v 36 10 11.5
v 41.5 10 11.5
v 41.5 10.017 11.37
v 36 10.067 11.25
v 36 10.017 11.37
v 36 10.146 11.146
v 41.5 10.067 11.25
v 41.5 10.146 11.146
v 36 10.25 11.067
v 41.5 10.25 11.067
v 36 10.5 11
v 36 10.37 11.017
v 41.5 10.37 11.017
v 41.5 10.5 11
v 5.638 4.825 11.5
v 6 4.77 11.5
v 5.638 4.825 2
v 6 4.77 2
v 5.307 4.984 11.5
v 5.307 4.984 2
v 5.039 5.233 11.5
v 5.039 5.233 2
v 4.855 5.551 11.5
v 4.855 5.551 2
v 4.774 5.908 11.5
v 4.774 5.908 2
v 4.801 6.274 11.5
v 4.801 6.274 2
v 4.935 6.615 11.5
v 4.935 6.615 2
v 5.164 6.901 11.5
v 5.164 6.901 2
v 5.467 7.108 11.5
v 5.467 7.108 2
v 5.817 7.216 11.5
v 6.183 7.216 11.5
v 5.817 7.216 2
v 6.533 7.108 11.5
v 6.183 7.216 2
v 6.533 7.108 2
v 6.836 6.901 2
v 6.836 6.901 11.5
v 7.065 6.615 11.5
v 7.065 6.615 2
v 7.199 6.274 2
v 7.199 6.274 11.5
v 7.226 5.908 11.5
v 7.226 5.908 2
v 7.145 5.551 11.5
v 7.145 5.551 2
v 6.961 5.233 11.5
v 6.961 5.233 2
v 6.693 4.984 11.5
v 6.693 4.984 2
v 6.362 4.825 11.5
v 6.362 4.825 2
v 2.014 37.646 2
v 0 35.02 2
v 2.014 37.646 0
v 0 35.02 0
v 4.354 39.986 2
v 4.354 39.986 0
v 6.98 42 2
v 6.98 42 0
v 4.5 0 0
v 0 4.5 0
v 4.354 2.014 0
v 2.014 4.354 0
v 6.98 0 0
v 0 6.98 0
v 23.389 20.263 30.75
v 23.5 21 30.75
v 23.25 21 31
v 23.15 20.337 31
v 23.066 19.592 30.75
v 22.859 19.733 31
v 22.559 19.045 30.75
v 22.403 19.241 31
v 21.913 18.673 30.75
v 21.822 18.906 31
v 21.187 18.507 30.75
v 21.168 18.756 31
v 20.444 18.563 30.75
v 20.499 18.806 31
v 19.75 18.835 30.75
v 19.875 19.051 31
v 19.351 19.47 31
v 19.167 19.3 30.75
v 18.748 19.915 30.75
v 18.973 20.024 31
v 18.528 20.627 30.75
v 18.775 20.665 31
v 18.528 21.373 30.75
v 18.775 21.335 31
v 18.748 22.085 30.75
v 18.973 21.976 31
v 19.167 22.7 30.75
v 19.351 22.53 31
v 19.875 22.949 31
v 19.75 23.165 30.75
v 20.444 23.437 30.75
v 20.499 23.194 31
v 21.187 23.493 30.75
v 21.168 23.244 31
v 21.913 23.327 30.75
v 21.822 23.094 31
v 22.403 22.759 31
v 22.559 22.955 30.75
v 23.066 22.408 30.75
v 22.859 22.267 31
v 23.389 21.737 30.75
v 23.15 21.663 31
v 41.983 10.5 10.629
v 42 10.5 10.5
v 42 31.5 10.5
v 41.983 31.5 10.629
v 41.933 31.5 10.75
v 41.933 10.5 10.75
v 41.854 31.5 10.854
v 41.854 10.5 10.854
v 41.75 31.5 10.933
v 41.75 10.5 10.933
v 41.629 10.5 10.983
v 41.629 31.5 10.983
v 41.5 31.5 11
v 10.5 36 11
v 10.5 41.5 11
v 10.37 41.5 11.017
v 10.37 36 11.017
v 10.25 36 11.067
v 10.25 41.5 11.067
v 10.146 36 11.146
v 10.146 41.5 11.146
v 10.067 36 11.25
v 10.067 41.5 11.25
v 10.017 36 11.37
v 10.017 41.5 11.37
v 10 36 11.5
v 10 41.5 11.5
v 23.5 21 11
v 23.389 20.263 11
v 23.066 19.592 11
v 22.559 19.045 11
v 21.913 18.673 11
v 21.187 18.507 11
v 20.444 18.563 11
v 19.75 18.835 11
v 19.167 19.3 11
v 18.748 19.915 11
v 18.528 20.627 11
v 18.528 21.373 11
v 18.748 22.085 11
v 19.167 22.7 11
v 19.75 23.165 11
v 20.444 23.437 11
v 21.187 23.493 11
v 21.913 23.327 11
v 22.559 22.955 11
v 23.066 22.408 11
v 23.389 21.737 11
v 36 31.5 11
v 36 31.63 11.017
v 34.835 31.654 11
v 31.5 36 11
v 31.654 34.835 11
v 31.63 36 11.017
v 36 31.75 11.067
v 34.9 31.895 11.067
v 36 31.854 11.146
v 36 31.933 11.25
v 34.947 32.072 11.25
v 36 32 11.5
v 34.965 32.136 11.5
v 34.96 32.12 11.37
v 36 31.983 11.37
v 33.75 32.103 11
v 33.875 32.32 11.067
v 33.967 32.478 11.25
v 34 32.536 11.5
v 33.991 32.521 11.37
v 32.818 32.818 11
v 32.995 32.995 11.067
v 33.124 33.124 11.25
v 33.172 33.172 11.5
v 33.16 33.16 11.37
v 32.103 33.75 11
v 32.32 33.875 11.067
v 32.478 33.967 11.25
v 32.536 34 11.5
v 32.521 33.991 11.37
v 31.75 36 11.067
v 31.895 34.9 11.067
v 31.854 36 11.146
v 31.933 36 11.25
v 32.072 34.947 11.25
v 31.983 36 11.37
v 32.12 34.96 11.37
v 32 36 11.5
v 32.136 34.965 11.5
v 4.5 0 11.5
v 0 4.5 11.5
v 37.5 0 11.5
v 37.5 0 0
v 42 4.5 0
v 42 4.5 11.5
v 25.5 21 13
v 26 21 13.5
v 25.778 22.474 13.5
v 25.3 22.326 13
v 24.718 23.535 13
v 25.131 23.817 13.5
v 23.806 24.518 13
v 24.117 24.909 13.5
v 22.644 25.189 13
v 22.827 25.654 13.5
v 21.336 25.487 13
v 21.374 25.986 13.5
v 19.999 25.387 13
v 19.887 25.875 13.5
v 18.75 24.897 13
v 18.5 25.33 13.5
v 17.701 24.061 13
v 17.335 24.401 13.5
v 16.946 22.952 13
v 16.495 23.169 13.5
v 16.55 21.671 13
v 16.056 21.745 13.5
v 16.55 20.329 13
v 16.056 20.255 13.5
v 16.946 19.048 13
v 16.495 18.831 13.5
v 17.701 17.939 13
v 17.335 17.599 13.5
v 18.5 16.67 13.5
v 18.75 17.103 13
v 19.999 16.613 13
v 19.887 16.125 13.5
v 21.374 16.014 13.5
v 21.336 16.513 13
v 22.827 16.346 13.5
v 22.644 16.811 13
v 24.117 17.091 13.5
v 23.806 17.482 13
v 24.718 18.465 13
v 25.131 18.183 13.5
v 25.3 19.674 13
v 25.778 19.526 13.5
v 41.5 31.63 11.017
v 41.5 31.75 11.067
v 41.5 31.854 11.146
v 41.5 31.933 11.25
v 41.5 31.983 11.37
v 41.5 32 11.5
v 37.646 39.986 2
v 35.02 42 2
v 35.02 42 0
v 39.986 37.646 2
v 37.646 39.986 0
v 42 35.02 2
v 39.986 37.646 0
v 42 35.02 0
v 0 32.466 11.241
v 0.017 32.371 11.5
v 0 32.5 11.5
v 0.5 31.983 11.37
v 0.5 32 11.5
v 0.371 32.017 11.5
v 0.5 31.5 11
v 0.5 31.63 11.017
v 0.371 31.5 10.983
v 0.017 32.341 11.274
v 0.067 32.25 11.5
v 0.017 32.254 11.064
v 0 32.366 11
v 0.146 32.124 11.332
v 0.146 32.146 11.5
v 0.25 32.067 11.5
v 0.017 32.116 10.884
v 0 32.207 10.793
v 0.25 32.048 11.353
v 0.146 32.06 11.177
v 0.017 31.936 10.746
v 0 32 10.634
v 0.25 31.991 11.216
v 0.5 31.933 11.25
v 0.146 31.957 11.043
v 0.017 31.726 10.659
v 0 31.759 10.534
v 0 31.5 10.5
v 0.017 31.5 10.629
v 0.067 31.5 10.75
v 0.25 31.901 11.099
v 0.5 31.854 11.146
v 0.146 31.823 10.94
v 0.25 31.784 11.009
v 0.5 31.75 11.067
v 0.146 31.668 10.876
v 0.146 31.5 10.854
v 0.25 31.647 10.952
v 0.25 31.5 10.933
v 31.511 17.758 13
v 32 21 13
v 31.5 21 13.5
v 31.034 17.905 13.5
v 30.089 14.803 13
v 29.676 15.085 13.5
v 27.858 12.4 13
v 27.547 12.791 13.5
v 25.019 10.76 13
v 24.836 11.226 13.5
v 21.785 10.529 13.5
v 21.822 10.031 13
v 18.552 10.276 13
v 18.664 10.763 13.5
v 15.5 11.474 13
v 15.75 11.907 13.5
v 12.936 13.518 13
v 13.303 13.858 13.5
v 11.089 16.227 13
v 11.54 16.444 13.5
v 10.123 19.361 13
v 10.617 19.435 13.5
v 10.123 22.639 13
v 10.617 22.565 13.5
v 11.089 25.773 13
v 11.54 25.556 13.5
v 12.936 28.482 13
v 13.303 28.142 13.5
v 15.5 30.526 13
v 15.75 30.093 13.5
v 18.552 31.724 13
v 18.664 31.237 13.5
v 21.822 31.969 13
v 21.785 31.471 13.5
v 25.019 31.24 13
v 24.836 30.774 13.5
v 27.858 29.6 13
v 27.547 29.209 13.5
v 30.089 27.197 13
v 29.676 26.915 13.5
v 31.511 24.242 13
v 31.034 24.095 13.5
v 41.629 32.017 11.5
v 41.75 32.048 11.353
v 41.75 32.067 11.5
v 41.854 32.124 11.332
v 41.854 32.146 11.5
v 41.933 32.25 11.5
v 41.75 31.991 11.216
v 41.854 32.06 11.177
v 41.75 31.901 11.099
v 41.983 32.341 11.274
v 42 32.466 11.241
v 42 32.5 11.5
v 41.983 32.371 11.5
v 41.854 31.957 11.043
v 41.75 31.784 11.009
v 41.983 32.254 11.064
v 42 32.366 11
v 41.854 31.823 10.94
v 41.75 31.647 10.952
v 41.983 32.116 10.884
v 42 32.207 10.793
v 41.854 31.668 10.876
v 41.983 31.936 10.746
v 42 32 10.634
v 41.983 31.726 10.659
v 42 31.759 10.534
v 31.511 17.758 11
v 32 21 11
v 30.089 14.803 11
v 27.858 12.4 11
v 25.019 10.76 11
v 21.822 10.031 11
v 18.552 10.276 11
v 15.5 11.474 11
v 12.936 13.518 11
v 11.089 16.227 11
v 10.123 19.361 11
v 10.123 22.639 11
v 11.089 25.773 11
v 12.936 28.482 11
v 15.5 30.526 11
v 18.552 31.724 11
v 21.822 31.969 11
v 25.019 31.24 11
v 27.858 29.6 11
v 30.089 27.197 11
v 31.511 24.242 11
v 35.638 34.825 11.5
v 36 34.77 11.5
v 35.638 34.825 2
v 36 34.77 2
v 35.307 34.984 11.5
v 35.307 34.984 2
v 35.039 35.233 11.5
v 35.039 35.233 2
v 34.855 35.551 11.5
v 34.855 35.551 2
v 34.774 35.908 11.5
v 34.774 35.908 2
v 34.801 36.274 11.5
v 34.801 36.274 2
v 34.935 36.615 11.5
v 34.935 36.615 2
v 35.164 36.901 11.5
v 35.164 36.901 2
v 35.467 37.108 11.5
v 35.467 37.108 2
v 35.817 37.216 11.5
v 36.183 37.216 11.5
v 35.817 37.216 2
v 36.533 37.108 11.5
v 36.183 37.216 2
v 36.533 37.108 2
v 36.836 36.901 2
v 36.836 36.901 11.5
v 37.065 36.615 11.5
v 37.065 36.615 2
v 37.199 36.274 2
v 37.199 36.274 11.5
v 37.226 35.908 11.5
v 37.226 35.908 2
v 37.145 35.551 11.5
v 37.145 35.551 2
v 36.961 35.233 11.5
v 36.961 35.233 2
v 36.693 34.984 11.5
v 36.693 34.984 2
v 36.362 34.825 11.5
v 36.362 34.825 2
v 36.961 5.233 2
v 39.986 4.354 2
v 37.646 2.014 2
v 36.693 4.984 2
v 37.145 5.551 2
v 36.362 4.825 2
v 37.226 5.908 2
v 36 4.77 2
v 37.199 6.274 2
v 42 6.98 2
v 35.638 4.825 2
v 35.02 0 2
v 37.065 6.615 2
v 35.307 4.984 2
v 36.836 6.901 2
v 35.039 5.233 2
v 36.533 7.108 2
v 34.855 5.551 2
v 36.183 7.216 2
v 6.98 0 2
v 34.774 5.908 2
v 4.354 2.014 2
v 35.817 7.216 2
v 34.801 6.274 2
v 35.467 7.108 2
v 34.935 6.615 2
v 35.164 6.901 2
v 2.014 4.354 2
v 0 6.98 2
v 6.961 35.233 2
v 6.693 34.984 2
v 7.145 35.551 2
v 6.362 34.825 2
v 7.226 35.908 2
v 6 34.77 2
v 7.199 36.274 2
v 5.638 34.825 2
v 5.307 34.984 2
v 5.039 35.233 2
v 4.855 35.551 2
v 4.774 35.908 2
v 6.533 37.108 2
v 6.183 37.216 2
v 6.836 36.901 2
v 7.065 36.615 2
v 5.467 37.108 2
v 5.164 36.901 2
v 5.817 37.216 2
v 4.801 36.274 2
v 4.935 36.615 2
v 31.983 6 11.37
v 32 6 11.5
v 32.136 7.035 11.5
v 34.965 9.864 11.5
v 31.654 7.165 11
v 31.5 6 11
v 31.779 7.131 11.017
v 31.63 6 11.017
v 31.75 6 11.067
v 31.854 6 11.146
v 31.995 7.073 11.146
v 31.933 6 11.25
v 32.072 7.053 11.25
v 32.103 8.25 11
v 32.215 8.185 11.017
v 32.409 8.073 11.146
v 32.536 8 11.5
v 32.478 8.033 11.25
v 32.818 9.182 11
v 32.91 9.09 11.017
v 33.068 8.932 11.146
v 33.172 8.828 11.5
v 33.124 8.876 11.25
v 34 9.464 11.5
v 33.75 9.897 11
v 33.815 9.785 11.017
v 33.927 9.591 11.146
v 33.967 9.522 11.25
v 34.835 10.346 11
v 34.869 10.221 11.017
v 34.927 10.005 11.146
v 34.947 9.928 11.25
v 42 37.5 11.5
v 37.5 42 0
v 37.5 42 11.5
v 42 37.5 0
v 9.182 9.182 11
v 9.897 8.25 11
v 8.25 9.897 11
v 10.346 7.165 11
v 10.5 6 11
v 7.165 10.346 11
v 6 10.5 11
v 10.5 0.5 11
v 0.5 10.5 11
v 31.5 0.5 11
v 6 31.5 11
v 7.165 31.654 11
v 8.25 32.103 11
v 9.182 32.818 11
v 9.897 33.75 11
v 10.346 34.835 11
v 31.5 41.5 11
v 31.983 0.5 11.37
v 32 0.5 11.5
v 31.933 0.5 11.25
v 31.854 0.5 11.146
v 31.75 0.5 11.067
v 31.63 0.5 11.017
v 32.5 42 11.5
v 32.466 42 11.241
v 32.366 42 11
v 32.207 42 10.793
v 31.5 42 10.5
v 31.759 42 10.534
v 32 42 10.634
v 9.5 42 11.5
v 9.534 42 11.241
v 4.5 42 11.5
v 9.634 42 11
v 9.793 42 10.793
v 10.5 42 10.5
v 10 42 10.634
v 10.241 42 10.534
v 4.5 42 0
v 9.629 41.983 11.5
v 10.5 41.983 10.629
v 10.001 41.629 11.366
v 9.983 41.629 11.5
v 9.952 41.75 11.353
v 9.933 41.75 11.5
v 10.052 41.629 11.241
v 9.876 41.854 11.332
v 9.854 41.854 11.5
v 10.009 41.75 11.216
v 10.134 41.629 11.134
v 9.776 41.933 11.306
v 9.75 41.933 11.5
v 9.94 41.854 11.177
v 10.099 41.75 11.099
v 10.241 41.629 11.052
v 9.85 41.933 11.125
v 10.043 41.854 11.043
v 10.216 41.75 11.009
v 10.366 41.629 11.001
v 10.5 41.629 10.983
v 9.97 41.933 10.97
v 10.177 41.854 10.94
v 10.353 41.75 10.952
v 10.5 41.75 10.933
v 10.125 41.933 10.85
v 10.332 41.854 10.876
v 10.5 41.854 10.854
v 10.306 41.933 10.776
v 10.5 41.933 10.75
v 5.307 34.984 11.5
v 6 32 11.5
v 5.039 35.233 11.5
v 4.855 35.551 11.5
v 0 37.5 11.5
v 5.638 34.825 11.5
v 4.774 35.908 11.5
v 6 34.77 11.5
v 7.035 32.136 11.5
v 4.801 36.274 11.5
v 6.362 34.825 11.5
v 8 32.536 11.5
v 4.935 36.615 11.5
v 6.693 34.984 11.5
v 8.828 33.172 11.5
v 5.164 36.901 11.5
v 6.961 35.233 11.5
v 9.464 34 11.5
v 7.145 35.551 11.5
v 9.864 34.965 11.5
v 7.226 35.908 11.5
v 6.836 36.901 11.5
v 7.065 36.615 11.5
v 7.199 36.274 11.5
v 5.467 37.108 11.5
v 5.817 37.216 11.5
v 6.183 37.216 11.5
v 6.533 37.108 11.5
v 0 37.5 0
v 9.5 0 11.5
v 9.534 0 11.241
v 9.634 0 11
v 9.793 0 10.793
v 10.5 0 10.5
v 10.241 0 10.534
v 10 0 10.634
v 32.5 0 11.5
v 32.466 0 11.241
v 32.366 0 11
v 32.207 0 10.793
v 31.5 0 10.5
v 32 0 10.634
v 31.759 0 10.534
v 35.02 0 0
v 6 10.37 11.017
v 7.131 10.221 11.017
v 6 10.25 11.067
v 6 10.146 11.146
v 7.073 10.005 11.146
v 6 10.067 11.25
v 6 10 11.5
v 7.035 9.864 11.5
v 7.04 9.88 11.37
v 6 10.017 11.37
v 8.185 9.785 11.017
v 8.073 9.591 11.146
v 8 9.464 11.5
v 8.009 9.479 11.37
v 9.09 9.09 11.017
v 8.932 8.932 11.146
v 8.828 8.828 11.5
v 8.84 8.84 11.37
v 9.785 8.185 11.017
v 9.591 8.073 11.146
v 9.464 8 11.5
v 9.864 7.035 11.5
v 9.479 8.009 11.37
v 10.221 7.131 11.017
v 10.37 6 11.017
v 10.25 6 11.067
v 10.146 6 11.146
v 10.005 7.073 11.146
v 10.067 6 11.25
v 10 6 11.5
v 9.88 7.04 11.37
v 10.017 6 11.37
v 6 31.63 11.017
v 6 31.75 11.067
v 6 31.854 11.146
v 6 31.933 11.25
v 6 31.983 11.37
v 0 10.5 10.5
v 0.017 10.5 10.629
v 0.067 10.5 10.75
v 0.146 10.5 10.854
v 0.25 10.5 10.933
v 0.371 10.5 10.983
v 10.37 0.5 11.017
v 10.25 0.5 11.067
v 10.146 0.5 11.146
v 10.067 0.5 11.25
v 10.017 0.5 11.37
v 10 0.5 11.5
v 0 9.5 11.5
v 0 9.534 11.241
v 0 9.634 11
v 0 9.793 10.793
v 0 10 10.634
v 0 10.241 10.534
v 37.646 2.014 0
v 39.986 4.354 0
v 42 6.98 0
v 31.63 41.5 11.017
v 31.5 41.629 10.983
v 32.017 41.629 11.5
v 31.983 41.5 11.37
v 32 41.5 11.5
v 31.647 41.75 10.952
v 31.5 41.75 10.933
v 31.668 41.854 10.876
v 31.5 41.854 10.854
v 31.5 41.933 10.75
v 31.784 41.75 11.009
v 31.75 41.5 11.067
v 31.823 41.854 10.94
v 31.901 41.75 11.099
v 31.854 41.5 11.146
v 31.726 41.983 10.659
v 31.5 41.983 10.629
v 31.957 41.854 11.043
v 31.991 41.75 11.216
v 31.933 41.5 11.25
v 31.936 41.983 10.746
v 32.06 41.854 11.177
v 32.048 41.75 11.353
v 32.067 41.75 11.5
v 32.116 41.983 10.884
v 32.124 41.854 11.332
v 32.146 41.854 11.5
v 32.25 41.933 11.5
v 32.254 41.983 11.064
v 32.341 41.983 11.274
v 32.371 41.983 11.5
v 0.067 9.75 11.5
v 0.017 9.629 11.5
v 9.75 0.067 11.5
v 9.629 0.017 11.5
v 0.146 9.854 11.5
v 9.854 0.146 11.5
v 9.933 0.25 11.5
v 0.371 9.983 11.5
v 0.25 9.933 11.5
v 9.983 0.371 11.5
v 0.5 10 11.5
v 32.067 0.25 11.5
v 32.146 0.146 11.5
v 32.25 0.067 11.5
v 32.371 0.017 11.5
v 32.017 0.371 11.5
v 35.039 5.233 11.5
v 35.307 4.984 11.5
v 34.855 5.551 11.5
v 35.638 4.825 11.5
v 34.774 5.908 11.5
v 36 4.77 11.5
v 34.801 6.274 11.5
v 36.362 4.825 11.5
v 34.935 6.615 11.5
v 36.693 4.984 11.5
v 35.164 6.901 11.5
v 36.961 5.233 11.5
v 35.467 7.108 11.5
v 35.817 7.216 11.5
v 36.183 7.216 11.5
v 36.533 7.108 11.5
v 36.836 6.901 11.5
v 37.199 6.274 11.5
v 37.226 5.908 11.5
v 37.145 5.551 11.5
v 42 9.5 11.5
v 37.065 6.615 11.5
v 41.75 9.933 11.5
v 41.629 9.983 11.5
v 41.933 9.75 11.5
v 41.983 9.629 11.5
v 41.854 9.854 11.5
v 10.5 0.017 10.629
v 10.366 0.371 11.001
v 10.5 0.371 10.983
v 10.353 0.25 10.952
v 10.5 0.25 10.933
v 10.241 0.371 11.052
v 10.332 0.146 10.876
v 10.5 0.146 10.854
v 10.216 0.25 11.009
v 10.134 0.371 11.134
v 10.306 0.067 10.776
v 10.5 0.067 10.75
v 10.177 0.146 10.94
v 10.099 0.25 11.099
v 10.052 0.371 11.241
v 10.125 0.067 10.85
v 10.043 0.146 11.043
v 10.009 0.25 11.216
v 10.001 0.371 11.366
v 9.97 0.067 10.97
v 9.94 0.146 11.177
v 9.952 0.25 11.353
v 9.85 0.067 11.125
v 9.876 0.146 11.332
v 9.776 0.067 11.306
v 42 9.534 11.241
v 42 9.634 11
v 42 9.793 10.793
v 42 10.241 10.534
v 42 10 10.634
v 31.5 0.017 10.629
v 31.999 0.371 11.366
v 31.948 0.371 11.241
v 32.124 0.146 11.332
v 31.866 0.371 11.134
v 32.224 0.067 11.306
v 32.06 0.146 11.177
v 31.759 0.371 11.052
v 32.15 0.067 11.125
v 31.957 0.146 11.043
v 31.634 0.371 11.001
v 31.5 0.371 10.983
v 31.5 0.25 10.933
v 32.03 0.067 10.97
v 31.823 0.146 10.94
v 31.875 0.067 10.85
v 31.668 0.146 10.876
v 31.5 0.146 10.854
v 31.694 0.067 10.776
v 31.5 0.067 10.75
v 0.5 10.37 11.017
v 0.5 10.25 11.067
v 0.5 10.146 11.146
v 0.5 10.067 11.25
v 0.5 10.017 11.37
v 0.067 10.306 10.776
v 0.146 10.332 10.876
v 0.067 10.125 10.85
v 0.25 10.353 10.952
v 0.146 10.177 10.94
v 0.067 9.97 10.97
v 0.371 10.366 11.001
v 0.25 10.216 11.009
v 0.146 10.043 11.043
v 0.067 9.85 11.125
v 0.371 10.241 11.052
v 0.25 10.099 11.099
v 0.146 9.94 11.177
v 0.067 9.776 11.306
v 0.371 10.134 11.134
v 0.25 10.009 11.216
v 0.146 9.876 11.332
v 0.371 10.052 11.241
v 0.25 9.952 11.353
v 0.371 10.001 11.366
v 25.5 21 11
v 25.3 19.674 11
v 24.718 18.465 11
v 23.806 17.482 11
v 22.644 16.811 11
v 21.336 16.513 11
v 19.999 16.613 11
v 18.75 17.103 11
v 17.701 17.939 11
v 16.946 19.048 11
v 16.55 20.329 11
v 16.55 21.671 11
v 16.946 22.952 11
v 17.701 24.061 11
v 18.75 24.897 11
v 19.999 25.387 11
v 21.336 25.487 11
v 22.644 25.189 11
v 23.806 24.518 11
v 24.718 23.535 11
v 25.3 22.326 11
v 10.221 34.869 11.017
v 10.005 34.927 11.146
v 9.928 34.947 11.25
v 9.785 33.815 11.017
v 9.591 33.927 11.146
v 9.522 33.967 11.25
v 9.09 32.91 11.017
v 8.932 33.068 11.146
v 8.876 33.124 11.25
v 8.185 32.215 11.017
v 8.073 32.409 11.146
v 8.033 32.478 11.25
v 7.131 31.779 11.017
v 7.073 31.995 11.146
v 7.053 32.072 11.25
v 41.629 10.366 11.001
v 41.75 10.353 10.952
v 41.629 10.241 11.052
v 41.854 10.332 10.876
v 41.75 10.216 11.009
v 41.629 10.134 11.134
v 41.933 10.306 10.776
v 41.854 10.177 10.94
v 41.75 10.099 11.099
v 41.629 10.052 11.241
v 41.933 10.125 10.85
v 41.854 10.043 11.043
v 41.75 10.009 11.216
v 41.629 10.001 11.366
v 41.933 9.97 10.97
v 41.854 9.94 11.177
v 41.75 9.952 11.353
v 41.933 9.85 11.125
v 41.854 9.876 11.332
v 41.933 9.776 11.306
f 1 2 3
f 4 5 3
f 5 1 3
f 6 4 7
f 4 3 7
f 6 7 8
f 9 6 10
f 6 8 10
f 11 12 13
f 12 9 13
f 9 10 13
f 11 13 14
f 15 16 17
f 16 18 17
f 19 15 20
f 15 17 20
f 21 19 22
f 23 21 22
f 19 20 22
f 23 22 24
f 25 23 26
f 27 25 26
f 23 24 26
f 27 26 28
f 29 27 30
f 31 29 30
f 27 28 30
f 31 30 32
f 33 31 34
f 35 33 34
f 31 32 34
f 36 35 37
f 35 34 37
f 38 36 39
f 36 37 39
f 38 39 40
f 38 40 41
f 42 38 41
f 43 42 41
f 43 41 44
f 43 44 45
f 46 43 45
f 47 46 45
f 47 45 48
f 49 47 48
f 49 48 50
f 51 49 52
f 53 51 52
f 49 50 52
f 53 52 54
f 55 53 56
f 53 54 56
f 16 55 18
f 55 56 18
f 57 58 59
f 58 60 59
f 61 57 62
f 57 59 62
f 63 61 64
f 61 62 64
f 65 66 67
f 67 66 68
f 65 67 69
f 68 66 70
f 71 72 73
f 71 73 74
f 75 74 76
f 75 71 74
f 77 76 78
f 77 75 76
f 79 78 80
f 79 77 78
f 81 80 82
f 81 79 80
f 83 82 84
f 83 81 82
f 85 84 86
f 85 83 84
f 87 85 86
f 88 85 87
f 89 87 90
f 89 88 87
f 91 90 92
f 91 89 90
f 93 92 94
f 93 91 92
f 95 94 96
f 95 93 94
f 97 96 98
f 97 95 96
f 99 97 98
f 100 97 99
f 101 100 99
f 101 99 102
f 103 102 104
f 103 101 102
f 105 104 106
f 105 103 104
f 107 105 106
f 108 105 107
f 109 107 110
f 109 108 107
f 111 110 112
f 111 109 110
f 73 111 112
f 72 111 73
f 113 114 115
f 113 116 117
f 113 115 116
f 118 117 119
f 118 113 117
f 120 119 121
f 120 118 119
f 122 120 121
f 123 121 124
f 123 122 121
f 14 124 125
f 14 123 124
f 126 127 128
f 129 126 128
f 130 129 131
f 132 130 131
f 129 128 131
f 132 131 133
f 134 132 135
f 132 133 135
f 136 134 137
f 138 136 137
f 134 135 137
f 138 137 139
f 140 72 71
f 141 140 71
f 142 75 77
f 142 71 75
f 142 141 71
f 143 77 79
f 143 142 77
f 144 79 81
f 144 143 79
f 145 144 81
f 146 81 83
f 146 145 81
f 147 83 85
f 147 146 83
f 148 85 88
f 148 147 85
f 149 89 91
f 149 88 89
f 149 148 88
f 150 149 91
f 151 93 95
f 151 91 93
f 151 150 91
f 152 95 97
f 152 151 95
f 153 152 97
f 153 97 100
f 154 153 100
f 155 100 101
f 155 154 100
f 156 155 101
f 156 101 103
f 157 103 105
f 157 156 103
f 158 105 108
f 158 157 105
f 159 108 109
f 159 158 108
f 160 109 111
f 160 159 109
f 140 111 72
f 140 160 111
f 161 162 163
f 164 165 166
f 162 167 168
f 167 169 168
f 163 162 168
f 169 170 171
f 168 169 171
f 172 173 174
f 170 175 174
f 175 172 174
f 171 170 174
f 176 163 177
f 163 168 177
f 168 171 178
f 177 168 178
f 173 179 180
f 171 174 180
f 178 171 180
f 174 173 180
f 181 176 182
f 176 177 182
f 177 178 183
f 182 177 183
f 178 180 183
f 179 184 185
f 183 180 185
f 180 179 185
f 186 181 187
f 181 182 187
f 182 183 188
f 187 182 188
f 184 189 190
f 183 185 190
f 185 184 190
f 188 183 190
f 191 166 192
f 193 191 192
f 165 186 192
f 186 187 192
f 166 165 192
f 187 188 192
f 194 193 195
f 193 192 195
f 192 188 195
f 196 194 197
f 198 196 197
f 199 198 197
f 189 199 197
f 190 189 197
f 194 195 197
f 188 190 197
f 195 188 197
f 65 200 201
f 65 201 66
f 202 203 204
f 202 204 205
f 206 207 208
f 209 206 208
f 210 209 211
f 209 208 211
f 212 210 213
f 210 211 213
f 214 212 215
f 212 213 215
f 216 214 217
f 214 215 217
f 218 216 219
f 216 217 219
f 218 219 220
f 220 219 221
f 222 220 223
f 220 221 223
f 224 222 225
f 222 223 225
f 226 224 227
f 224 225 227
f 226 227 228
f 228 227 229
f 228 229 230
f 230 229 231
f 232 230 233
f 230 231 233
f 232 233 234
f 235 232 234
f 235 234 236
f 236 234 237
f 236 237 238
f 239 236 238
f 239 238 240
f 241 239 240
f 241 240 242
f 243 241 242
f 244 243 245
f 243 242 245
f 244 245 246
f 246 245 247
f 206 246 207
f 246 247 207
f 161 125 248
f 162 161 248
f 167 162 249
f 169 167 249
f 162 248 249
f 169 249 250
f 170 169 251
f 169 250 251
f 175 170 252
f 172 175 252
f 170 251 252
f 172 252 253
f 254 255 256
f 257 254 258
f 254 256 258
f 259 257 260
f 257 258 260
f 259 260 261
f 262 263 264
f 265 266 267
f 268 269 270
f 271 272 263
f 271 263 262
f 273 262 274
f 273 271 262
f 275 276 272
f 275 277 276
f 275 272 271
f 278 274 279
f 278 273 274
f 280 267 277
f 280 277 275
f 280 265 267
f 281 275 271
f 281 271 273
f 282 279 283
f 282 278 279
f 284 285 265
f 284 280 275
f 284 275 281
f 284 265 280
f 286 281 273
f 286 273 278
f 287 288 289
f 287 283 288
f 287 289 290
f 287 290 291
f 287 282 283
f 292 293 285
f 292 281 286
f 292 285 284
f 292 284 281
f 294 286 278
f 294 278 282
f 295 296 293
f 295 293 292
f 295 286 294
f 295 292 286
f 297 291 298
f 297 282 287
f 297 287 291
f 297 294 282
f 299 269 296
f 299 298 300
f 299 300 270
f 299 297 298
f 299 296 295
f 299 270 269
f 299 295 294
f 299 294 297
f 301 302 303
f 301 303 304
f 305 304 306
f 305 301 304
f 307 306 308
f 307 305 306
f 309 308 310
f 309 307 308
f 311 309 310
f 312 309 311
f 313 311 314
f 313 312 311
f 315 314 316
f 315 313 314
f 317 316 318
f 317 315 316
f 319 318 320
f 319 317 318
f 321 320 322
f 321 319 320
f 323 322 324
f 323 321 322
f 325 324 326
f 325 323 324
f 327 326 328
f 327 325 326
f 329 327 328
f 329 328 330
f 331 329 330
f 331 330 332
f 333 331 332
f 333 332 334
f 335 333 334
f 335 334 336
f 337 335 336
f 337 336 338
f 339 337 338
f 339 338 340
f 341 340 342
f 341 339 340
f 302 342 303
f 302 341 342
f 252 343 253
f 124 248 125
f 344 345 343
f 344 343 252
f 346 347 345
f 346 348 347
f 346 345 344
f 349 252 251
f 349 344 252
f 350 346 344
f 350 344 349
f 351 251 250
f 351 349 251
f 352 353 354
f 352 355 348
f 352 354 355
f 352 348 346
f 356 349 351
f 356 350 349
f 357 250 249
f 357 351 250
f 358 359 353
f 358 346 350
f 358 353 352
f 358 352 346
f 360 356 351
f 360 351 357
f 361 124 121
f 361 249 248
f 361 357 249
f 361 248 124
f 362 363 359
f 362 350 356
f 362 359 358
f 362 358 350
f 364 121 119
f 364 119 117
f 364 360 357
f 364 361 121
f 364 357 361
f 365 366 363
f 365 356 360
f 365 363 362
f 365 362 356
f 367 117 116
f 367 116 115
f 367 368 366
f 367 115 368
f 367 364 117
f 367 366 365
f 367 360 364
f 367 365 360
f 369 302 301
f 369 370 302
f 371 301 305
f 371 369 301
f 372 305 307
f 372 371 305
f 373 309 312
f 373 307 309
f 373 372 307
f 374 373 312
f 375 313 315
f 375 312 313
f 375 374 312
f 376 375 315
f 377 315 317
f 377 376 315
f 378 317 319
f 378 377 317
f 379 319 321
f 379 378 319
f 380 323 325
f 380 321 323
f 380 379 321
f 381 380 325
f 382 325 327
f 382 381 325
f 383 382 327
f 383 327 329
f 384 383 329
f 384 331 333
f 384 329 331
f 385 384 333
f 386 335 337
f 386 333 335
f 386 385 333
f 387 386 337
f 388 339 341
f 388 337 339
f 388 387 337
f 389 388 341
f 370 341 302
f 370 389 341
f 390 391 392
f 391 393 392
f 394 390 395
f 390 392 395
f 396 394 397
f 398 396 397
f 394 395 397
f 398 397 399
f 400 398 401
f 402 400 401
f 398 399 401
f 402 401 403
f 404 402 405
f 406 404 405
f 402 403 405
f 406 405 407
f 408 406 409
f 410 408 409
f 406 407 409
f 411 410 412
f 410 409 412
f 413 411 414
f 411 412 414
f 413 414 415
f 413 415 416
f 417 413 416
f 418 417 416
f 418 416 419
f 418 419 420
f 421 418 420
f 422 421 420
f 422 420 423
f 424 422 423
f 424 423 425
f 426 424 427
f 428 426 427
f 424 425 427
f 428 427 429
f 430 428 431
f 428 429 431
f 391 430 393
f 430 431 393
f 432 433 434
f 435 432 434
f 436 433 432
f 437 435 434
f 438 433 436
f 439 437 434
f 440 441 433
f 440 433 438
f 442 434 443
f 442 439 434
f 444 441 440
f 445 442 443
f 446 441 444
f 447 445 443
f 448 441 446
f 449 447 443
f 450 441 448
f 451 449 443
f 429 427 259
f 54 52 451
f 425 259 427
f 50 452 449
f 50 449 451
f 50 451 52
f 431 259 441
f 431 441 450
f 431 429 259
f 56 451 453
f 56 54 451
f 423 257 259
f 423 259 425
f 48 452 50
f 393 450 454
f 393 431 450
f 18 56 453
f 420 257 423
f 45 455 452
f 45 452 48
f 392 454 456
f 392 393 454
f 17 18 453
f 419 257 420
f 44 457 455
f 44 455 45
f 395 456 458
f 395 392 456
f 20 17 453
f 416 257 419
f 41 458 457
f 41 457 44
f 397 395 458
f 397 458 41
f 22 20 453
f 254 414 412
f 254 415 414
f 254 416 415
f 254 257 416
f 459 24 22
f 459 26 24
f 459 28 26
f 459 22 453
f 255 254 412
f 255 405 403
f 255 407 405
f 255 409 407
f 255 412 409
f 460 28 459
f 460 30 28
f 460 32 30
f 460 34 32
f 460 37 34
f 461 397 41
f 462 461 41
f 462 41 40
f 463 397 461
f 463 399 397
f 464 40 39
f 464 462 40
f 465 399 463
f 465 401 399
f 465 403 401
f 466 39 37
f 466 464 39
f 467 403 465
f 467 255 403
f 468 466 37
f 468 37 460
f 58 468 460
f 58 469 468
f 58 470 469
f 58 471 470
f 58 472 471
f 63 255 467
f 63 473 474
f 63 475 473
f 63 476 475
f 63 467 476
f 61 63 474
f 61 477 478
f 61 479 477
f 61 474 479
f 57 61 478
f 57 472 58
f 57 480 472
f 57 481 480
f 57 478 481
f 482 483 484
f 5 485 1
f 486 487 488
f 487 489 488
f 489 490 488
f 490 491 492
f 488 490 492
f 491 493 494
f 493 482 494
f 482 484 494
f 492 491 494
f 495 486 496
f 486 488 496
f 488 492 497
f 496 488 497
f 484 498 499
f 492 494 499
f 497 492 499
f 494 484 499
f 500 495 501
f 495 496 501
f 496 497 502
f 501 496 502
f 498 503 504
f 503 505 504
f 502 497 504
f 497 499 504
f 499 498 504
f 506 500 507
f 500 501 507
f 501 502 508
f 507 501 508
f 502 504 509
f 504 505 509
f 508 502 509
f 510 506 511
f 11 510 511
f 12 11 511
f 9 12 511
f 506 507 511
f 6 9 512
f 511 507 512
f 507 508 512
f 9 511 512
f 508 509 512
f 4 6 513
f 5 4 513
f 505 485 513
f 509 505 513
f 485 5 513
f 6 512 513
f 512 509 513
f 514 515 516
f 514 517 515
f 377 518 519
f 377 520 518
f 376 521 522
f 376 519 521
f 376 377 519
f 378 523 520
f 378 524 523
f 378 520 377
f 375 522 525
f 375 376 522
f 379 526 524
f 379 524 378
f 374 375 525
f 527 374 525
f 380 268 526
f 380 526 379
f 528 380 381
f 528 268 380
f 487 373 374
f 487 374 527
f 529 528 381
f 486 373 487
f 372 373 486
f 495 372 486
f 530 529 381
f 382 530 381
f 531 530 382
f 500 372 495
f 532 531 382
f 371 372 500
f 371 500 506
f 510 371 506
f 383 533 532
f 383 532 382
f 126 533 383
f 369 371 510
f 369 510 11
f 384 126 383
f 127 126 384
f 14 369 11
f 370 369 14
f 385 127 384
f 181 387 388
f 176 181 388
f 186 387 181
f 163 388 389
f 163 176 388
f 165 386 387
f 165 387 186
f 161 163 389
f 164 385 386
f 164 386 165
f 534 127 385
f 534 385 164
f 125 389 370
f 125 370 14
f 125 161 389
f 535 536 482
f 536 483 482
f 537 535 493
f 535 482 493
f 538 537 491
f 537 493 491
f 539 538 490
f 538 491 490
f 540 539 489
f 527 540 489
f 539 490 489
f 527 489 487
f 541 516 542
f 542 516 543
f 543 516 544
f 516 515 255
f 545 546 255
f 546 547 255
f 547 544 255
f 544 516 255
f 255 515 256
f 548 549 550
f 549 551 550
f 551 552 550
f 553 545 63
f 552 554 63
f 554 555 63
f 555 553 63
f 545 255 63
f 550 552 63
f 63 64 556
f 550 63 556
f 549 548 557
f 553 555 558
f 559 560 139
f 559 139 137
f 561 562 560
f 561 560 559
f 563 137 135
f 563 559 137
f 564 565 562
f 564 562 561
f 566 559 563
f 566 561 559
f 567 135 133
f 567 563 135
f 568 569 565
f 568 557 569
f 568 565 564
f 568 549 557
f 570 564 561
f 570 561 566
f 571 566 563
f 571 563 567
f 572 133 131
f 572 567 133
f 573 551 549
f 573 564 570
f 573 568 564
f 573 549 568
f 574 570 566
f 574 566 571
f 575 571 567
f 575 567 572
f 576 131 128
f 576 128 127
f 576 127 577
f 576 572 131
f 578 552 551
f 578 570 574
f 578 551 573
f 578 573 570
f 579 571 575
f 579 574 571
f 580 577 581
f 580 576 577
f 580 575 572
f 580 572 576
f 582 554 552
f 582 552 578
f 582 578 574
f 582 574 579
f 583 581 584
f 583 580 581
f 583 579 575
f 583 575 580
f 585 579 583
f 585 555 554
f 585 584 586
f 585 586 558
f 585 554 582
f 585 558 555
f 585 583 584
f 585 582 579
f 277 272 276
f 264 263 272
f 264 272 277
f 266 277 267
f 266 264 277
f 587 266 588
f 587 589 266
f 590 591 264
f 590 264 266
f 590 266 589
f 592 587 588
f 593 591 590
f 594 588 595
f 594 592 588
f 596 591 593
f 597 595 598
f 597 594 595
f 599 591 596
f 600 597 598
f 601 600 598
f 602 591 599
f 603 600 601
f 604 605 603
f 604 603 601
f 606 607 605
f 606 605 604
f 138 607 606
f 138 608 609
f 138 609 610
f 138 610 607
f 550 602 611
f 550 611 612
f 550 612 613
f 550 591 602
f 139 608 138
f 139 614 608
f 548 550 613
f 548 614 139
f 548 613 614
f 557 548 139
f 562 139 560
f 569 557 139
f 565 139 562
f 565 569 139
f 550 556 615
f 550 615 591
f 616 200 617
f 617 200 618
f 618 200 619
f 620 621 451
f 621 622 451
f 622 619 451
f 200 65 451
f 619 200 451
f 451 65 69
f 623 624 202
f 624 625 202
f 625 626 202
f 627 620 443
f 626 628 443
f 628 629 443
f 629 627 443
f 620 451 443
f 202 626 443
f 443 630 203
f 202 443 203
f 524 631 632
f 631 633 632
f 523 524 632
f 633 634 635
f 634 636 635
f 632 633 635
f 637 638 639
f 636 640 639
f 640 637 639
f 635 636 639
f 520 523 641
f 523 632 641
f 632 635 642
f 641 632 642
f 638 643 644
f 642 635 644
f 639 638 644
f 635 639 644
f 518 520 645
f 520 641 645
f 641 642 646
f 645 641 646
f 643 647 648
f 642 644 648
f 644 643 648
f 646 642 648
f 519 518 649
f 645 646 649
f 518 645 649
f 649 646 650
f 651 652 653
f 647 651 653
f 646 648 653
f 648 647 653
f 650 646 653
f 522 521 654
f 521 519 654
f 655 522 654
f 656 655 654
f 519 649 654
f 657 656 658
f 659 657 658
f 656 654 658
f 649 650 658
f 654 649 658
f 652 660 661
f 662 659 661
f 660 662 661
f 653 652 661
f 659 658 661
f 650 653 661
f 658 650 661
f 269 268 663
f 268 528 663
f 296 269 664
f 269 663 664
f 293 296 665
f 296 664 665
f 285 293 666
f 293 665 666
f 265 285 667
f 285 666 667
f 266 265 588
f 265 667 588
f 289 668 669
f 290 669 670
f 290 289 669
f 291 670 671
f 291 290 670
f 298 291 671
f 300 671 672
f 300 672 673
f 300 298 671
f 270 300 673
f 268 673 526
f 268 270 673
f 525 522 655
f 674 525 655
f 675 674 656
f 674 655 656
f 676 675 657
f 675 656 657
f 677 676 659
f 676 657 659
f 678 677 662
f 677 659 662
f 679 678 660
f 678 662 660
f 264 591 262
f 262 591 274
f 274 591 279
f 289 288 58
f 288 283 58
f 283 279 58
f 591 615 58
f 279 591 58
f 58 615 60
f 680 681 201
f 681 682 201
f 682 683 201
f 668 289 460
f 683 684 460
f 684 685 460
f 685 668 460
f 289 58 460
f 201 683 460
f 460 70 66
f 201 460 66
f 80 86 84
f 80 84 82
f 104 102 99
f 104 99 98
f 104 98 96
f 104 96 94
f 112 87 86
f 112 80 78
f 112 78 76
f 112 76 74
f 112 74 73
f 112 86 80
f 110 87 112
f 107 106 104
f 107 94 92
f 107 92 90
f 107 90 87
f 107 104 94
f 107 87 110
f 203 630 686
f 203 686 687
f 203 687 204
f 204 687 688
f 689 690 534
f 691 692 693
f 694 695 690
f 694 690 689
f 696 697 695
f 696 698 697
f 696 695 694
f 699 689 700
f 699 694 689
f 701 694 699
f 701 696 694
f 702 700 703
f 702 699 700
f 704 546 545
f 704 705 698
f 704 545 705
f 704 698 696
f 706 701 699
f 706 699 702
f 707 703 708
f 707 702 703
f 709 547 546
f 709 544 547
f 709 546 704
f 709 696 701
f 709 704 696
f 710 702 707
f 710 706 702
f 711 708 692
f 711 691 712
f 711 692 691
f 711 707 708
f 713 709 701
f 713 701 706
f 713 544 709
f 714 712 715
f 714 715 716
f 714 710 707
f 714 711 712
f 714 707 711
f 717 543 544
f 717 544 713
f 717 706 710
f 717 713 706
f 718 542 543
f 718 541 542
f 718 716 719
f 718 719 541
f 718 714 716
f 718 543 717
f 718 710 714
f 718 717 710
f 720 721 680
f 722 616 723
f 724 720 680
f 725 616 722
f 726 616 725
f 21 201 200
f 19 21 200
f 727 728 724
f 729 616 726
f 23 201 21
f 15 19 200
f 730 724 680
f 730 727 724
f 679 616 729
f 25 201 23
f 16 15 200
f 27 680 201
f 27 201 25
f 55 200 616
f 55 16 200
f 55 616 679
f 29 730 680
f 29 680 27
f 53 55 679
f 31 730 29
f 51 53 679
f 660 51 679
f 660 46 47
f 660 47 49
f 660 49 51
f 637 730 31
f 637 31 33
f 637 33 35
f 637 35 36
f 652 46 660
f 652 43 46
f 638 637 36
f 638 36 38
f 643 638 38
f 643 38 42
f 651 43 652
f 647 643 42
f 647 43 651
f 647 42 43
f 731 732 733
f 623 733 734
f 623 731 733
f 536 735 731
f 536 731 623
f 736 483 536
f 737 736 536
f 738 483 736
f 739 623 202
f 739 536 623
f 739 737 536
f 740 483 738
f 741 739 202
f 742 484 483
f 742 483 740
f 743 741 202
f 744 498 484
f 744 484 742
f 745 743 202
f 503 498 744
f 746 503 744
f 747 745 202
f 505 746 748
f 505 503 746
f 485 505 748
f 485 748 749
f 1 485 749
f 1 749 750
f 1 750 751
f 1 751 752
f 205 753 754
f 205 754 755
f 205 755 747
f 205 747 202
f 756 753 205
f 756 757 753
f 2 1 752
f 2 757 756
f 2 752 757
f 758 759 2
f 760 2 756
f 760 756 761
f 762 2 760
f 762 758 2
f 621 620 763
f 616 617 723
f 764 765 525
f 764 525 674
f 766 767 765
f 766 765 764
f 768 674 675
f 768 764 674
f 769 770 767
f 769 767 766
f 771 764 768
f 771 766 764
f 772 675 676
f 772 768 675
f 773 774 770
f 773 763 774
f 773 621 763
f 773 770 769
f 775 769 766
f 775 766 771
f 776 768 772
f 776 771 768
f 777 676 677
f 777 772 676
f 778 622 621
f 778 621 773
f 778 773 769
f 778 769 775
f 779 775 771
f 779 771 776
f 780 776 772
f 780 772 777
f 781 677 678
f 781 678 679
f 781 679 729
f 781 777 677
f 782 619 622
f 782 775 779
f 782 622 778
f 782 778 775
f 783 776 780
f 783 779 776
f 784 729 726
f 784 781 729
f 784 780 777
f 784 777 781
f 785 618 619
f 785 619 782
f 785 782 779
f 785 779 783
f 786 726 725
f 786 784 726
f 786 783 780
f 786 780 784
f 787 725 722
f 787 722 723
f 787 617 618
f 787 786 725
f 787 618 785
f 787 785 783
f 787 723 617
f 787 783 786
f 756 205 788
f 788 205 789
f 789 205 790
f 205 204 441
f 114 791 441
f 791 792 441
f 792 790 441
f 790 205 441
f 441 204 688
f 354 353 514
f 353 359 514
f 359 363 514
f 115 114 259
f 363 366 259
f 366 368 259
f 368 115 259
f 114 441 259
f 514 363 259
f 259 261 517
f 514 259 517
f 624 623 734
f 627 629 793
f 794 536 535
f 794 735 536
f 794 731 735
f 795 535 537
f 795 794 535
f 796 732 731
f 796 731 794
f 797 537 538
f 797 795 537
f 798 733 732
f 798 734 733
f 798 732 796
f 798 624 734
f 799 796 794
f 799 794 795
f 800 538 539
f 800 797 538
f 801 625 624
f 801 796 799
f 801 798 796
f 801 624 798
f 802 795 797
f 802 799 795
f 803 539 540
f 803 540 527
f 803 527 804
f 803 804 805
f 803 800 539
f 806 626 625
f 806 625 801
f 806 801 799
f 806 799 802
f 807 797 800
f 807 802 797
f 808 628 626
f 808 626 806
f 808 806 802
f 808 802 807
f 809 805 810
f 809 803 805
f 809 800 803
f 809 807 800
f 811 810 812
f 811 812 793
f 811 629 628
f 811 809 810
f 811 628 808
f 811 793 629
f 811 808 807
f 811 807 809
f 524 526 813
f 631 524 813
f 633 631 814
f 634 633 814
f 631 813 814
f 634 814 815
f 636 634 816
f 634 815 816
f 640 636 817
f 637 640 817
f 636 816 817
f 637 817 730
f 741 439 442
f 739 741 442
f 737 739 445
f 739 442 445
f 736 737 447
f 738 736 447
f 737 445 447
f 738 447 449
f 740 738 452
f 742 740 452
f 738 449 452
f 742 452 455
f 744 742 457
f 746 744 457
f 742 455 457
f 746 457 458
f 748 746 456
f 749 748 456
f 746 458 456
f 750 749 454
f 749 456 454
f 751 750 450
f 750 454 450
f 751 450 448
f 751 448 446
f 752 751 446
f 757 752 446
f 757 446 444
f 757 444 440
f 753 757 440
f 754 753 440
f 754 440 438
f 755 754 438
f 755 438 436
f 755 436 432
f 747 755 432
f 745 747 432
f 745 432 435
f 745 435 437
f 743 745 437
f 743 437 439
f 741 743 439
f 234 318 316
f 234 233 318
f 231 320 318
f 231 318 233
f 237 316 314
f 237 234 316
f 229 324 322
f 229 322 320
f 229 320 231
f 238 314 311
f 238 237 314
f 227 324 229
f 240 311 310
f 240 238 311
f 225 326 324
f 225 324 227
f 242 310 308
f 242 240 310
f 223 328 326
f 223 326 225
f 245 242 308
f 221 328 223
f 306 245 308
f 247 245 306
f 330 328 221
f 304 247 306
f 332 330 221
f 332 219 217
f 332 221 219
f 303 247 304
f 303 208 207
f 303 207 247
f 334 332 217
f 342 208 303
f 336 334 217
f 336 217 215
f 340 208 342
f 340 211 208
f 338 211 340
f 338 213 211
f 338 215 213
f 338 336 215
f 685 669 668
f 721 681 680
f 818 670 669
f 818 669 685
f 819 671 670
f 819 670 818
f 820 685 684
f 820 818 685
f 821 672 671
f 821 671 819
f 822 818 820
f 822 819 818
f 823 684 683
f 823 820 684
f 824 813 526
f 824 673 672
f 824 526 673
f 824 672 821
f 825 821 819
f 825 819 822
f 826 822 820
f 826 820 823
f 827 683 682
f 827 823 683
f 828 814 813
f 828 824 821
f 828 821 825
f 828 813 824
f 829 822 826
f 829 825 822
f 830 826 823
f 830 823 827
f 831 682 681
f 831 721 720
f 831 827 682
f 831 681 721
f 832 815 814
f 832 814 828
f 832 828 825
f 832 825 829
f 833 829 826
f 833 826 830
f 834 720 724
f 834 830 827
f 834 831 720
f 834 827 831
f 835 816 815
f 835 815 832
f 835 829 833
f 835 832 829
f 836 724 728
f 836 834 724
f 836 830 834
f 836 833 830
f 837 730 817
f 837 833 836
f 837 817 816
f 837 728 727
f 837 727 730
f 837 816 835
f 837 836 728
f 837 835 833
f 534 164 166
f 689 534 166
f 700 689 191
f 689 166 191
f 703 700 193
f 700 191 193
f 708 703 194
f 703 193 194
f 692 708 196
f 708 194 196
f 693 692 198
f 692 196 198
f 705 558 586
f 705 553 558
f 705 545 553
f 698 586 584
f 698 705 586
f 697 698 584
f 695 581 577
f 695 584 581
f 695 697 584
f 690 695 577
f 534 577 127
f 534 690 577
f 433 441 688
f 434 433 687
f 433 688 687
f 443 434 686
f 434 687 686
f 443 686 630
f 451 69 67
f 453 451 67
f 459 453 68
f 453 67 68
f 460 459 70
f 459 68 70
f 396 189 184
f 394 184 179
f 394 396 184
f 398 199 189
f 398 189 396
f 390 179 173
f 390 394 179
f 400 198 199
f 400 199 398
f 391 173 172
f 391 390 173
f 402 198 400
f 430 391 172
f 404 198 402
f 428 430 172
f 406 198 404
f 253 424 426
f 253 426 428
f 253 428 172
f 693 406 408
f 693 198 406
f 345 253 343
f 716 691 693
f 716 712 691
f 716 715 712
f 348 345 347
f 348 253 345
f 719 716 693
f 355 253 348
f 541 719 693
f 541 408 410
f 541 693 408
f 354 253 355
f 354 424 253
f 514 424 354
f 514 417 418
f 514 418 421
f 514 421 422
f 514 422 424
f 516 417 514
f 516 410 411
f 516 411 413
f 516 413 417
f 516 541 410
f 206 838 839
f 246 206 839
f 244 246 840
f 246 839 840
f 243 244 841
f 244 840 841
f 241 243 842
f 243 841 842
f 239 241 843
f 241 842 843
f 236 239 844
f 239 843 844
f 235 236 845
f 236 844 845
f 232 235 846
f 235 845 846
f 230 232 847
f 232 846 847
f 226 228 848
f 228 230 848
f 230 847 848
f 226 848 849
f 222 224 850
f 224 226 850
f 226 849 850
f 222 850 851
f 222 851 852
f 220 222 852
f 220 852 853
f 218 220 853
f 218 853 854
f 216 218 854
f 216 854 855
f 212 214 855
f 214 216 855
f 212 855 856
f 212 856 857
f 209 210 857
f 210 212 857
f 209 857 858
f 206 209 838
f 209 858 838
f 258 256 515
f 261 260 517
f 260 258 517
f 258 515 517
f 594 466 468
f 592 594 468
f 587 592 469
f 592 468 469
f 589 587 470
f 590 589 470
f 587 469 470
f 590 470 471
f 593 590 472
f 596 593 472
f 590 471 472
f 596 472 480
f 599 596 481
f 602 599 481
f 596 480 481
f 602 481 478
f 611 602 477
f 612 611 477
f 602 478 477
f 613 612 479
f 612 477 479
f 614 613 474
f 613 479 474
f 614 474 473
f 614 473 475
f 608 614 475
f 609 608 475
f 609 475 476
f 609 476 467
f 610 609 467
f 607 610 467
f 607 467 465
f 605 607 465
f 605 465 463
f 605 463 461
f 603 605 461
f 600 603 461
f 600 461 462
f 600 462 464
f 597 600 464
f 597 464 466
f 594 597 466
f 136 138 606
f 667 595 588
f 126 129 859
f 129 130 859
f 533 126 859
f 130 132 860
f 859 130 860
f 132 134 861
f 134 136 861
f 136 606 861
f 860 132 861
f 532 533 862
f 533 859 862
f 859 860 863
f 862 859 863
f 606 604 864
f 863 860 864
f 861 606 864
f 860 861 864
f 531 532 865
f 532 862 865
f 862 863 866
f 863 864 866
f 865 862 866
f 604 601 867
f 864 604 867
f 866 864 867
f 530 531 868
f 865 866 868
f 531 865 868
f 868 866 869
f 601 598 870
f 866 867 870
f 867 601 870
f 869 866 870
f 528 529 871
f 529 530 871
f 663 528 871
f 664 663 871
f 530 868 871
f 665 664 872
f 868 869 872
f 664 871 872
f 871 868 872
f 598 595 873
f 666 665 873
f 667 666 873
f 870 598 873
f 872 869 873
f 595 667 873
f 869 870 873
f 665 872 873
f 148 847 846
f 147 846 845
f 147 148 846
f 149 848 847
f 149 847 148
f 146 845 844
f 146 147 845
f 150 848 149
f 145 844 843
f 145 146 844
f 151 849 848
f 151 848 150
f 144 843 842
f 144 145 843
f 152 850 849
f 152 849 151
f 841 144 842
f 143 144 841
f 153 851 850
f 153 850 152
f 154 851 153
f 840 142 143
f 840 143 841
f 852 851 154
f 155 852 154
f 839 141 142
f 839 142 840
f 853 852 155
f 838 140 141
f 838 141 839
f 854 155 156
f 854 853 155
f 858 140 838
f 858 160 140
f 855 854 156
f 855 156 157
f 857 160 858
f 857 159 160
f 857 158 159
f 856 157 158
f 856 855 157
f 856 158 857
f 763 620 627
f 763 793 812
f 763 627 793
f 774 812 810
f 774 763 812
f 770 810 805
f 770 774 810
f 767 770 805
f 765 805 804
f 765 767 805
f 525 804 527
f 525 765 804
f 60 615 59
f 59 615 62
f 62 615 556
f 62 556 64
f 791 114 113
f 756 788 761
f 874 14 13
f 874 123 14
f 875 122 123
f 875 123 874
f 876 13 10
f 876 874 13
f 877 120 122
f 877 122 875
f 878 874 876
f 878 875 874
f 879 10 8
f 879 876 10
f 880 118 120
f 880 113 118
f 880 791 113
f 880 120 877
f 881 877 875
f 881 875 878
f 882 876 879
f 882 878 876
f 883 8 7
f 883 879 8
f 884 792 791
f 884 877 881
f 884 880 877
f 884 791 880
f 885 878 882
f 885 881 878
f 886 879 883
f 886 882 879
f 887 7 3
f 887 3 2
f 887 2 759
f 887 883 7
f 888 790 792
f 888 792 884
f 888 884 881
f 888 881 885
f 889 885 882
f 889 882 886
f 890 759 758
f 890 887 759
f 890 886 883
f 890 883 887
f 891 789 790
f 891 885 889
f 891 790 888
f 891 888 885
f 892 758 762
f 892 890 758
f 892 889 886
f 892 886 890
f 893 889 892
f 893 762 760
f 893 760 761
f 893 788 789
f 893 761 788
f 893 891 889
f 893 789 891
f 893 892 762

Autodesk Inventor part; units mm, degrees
ref_plane "YZ Plane" through (0, 0, 0) normal (1, 0, 0) x (0, 1, 0)
ref_plane "XZ Plane" through (0, 0, 0) normal (0, 1, 0) x (-1, 0, 0)
ref_plane "XY Plane" through (0, 0, 0) normal (0, 0, 1) x (1, 0, 0)
sketch "Sketch1" plane through (0, 0, 0) normal (0, 0, 1) x (1, 0, 0)
  line L0 (0, 0) -> (42, 0)
  line L1 (42, 0) -> (42, 42)
  line L2 (42, 42) -> (0, 42)
  line L3 (0, 42) -> (0, 0)
  dimension "d0" = 42
  dimension "d1" = 42
extrude "Extrusion1" add sketch "Sketch1" along normal blind 11.5
chamfer "Chamfer1" distance 4.5 angle 45 4 edges at (0, 0, 5.75) (42, 0, 5.75) (42, 42, 5.75) (0, 42, 5.75)
sketch "Sketch2" plane through (0, 0, 11.5) normal (0, 0, 1) x (1, 0, 0)
  line L0 (4.5, 42) -> (37.5, 42) projected
  line L1 (0, 4.5) -> (0, 37.5) projected
  line L2 (37.5, 0) -> (4.5, 0) projected
  line L3 (42, 37.5) -> (42, 4.5) projected
  line L4 (10, 0) -> (10, 6)
  line L5 (10, 36) -> (10, 42)
  line L6 (0, 32) -> (6, 32)
  line L7 (36, 32) -> (42, 32)
  line L8 (0, 10) -> (6, 10)
  line L9 (36, 10) -> (42, 10)
  line L10 (32, 42) -> (32, 36)
  line L11 (32, 6) -> (32, 0)
  arc A0 (6, 32) -> (10, 36) centre (6, 36) ccw
  arc A1 (32, 36) -> (36, 32) centre (36, 36) ccw
  arc A2 (36, 10) -> (32, 6) centre (36, 6) ccw
  arc A3 (10, 6) -> (6, 10) centre (6, 6) ccw
  dimension "d10" = 4
extrude "Extrusion2" cut sketch "Sketch2" against normal blind 0.5
fillet "Fillet1" radius 0.5 12 edges at (8.8284, 8.8284, 11) (10, 3, 11) (3, 10, 11) (3, 32, 11) (8.8284, 33.1716, 11) (10, 39, 11) (33.1716, 33.1716, 11) (32, 39, 11) (39, 32, 11) (39, 10, 11) (33.1716, 8.8284, 11) (32, 3, 11)
fillet "Fillet2" radius 0.5 12 edges at (0, 21, 11) (0, 10.1463, 11.1463) (0, 31.8537, 11.1463) (21, 42, 11) (10.1463, 42, 11.1463) (31.8537, 42, 11.1463) (42, 21, 11) (42, 31.8537, 11.1463) (42, 10.1463, 11.1463) (21, 0, 11) (31.8537, 0, 11.1463) (10.1463, 0, 11.1463)
sketch "Sketch3" plane through (0, 0, 11) normal (0, 0, 1) x (1, 0, 0)
  circle A0 centre (21, 21) radius 11
  line L0 (10.5, 0) -> (31.5, 0) projected
  line L1 (0, 31.5) -> (0, 10.5) projected
  circle A1 centre (21, 21) radius 4.5
  dimension "d15" = 22
  dimension "d16" = 21
  dimension "d17" = 21
  dimension "d18" = 9
extrude "Extrusion3" add sketch "Sketch3" along normal blind 2.5
chamfer "Chamfer2" distance 0.5 angle 45 2 edges at (10, 21, 13.5) (16.5, 21, 13.5)
sketch "Sketch4" plane through (21, 21, 11) normal (0, 0, 1) x (1, 0, 0)
  circle A0 centre (0, 0) radius 4.5 projected
  circle A1 centre (0, 0) radius 2.5
  dimension "d23" = 5
extrude "Extrusion4" add sketch "Sketch4" along normal blind 20 contours A1
sketch "Sketch5" plane through (0, 0, 11.5) normal (0, 0, 1) x (1, 0, 0)
  arc A0 (10, 6) -> (6, 10) centre (6, 6) ccw projected
  point P0 (36, 6)
  point P1 (6, 36)
  point P2 (36, 36)
  dimension "d28" = 30
  dimension "d29" = 30
hole "Hole1" at (6, 6, 11.5) at (36, 6, 11.5) at (6, 36, 11.5) at (36, 36, 11.5) direction (0, 0, -1) diameter 2.459 end through all thread size "M3x0.5" class "6H" standard "ANSI Metric M Profile"
sketch "Sketch6" plane through (0, 0, 0) normal (0, 0, -1) x (-1, 0, 0)
  line L0 (-42, 4.5) -> (-42, 37.5) projected
  line L1 (-4.5, 0) -> (-37.5, 0) projected
  circle A0 centre (-21, 21) radius 25.25
  dimension "d37" = 50.5
  dimension "d38" = 21
  dimension "d39" = 21
extrude "Extrusion5" cut sketch "Sketch6" against normal blind 2
chamfer "倒角4" distance 0.25 angle 45 1 edges at (18.5, 21, 31)
properties part number "stepper_front"
